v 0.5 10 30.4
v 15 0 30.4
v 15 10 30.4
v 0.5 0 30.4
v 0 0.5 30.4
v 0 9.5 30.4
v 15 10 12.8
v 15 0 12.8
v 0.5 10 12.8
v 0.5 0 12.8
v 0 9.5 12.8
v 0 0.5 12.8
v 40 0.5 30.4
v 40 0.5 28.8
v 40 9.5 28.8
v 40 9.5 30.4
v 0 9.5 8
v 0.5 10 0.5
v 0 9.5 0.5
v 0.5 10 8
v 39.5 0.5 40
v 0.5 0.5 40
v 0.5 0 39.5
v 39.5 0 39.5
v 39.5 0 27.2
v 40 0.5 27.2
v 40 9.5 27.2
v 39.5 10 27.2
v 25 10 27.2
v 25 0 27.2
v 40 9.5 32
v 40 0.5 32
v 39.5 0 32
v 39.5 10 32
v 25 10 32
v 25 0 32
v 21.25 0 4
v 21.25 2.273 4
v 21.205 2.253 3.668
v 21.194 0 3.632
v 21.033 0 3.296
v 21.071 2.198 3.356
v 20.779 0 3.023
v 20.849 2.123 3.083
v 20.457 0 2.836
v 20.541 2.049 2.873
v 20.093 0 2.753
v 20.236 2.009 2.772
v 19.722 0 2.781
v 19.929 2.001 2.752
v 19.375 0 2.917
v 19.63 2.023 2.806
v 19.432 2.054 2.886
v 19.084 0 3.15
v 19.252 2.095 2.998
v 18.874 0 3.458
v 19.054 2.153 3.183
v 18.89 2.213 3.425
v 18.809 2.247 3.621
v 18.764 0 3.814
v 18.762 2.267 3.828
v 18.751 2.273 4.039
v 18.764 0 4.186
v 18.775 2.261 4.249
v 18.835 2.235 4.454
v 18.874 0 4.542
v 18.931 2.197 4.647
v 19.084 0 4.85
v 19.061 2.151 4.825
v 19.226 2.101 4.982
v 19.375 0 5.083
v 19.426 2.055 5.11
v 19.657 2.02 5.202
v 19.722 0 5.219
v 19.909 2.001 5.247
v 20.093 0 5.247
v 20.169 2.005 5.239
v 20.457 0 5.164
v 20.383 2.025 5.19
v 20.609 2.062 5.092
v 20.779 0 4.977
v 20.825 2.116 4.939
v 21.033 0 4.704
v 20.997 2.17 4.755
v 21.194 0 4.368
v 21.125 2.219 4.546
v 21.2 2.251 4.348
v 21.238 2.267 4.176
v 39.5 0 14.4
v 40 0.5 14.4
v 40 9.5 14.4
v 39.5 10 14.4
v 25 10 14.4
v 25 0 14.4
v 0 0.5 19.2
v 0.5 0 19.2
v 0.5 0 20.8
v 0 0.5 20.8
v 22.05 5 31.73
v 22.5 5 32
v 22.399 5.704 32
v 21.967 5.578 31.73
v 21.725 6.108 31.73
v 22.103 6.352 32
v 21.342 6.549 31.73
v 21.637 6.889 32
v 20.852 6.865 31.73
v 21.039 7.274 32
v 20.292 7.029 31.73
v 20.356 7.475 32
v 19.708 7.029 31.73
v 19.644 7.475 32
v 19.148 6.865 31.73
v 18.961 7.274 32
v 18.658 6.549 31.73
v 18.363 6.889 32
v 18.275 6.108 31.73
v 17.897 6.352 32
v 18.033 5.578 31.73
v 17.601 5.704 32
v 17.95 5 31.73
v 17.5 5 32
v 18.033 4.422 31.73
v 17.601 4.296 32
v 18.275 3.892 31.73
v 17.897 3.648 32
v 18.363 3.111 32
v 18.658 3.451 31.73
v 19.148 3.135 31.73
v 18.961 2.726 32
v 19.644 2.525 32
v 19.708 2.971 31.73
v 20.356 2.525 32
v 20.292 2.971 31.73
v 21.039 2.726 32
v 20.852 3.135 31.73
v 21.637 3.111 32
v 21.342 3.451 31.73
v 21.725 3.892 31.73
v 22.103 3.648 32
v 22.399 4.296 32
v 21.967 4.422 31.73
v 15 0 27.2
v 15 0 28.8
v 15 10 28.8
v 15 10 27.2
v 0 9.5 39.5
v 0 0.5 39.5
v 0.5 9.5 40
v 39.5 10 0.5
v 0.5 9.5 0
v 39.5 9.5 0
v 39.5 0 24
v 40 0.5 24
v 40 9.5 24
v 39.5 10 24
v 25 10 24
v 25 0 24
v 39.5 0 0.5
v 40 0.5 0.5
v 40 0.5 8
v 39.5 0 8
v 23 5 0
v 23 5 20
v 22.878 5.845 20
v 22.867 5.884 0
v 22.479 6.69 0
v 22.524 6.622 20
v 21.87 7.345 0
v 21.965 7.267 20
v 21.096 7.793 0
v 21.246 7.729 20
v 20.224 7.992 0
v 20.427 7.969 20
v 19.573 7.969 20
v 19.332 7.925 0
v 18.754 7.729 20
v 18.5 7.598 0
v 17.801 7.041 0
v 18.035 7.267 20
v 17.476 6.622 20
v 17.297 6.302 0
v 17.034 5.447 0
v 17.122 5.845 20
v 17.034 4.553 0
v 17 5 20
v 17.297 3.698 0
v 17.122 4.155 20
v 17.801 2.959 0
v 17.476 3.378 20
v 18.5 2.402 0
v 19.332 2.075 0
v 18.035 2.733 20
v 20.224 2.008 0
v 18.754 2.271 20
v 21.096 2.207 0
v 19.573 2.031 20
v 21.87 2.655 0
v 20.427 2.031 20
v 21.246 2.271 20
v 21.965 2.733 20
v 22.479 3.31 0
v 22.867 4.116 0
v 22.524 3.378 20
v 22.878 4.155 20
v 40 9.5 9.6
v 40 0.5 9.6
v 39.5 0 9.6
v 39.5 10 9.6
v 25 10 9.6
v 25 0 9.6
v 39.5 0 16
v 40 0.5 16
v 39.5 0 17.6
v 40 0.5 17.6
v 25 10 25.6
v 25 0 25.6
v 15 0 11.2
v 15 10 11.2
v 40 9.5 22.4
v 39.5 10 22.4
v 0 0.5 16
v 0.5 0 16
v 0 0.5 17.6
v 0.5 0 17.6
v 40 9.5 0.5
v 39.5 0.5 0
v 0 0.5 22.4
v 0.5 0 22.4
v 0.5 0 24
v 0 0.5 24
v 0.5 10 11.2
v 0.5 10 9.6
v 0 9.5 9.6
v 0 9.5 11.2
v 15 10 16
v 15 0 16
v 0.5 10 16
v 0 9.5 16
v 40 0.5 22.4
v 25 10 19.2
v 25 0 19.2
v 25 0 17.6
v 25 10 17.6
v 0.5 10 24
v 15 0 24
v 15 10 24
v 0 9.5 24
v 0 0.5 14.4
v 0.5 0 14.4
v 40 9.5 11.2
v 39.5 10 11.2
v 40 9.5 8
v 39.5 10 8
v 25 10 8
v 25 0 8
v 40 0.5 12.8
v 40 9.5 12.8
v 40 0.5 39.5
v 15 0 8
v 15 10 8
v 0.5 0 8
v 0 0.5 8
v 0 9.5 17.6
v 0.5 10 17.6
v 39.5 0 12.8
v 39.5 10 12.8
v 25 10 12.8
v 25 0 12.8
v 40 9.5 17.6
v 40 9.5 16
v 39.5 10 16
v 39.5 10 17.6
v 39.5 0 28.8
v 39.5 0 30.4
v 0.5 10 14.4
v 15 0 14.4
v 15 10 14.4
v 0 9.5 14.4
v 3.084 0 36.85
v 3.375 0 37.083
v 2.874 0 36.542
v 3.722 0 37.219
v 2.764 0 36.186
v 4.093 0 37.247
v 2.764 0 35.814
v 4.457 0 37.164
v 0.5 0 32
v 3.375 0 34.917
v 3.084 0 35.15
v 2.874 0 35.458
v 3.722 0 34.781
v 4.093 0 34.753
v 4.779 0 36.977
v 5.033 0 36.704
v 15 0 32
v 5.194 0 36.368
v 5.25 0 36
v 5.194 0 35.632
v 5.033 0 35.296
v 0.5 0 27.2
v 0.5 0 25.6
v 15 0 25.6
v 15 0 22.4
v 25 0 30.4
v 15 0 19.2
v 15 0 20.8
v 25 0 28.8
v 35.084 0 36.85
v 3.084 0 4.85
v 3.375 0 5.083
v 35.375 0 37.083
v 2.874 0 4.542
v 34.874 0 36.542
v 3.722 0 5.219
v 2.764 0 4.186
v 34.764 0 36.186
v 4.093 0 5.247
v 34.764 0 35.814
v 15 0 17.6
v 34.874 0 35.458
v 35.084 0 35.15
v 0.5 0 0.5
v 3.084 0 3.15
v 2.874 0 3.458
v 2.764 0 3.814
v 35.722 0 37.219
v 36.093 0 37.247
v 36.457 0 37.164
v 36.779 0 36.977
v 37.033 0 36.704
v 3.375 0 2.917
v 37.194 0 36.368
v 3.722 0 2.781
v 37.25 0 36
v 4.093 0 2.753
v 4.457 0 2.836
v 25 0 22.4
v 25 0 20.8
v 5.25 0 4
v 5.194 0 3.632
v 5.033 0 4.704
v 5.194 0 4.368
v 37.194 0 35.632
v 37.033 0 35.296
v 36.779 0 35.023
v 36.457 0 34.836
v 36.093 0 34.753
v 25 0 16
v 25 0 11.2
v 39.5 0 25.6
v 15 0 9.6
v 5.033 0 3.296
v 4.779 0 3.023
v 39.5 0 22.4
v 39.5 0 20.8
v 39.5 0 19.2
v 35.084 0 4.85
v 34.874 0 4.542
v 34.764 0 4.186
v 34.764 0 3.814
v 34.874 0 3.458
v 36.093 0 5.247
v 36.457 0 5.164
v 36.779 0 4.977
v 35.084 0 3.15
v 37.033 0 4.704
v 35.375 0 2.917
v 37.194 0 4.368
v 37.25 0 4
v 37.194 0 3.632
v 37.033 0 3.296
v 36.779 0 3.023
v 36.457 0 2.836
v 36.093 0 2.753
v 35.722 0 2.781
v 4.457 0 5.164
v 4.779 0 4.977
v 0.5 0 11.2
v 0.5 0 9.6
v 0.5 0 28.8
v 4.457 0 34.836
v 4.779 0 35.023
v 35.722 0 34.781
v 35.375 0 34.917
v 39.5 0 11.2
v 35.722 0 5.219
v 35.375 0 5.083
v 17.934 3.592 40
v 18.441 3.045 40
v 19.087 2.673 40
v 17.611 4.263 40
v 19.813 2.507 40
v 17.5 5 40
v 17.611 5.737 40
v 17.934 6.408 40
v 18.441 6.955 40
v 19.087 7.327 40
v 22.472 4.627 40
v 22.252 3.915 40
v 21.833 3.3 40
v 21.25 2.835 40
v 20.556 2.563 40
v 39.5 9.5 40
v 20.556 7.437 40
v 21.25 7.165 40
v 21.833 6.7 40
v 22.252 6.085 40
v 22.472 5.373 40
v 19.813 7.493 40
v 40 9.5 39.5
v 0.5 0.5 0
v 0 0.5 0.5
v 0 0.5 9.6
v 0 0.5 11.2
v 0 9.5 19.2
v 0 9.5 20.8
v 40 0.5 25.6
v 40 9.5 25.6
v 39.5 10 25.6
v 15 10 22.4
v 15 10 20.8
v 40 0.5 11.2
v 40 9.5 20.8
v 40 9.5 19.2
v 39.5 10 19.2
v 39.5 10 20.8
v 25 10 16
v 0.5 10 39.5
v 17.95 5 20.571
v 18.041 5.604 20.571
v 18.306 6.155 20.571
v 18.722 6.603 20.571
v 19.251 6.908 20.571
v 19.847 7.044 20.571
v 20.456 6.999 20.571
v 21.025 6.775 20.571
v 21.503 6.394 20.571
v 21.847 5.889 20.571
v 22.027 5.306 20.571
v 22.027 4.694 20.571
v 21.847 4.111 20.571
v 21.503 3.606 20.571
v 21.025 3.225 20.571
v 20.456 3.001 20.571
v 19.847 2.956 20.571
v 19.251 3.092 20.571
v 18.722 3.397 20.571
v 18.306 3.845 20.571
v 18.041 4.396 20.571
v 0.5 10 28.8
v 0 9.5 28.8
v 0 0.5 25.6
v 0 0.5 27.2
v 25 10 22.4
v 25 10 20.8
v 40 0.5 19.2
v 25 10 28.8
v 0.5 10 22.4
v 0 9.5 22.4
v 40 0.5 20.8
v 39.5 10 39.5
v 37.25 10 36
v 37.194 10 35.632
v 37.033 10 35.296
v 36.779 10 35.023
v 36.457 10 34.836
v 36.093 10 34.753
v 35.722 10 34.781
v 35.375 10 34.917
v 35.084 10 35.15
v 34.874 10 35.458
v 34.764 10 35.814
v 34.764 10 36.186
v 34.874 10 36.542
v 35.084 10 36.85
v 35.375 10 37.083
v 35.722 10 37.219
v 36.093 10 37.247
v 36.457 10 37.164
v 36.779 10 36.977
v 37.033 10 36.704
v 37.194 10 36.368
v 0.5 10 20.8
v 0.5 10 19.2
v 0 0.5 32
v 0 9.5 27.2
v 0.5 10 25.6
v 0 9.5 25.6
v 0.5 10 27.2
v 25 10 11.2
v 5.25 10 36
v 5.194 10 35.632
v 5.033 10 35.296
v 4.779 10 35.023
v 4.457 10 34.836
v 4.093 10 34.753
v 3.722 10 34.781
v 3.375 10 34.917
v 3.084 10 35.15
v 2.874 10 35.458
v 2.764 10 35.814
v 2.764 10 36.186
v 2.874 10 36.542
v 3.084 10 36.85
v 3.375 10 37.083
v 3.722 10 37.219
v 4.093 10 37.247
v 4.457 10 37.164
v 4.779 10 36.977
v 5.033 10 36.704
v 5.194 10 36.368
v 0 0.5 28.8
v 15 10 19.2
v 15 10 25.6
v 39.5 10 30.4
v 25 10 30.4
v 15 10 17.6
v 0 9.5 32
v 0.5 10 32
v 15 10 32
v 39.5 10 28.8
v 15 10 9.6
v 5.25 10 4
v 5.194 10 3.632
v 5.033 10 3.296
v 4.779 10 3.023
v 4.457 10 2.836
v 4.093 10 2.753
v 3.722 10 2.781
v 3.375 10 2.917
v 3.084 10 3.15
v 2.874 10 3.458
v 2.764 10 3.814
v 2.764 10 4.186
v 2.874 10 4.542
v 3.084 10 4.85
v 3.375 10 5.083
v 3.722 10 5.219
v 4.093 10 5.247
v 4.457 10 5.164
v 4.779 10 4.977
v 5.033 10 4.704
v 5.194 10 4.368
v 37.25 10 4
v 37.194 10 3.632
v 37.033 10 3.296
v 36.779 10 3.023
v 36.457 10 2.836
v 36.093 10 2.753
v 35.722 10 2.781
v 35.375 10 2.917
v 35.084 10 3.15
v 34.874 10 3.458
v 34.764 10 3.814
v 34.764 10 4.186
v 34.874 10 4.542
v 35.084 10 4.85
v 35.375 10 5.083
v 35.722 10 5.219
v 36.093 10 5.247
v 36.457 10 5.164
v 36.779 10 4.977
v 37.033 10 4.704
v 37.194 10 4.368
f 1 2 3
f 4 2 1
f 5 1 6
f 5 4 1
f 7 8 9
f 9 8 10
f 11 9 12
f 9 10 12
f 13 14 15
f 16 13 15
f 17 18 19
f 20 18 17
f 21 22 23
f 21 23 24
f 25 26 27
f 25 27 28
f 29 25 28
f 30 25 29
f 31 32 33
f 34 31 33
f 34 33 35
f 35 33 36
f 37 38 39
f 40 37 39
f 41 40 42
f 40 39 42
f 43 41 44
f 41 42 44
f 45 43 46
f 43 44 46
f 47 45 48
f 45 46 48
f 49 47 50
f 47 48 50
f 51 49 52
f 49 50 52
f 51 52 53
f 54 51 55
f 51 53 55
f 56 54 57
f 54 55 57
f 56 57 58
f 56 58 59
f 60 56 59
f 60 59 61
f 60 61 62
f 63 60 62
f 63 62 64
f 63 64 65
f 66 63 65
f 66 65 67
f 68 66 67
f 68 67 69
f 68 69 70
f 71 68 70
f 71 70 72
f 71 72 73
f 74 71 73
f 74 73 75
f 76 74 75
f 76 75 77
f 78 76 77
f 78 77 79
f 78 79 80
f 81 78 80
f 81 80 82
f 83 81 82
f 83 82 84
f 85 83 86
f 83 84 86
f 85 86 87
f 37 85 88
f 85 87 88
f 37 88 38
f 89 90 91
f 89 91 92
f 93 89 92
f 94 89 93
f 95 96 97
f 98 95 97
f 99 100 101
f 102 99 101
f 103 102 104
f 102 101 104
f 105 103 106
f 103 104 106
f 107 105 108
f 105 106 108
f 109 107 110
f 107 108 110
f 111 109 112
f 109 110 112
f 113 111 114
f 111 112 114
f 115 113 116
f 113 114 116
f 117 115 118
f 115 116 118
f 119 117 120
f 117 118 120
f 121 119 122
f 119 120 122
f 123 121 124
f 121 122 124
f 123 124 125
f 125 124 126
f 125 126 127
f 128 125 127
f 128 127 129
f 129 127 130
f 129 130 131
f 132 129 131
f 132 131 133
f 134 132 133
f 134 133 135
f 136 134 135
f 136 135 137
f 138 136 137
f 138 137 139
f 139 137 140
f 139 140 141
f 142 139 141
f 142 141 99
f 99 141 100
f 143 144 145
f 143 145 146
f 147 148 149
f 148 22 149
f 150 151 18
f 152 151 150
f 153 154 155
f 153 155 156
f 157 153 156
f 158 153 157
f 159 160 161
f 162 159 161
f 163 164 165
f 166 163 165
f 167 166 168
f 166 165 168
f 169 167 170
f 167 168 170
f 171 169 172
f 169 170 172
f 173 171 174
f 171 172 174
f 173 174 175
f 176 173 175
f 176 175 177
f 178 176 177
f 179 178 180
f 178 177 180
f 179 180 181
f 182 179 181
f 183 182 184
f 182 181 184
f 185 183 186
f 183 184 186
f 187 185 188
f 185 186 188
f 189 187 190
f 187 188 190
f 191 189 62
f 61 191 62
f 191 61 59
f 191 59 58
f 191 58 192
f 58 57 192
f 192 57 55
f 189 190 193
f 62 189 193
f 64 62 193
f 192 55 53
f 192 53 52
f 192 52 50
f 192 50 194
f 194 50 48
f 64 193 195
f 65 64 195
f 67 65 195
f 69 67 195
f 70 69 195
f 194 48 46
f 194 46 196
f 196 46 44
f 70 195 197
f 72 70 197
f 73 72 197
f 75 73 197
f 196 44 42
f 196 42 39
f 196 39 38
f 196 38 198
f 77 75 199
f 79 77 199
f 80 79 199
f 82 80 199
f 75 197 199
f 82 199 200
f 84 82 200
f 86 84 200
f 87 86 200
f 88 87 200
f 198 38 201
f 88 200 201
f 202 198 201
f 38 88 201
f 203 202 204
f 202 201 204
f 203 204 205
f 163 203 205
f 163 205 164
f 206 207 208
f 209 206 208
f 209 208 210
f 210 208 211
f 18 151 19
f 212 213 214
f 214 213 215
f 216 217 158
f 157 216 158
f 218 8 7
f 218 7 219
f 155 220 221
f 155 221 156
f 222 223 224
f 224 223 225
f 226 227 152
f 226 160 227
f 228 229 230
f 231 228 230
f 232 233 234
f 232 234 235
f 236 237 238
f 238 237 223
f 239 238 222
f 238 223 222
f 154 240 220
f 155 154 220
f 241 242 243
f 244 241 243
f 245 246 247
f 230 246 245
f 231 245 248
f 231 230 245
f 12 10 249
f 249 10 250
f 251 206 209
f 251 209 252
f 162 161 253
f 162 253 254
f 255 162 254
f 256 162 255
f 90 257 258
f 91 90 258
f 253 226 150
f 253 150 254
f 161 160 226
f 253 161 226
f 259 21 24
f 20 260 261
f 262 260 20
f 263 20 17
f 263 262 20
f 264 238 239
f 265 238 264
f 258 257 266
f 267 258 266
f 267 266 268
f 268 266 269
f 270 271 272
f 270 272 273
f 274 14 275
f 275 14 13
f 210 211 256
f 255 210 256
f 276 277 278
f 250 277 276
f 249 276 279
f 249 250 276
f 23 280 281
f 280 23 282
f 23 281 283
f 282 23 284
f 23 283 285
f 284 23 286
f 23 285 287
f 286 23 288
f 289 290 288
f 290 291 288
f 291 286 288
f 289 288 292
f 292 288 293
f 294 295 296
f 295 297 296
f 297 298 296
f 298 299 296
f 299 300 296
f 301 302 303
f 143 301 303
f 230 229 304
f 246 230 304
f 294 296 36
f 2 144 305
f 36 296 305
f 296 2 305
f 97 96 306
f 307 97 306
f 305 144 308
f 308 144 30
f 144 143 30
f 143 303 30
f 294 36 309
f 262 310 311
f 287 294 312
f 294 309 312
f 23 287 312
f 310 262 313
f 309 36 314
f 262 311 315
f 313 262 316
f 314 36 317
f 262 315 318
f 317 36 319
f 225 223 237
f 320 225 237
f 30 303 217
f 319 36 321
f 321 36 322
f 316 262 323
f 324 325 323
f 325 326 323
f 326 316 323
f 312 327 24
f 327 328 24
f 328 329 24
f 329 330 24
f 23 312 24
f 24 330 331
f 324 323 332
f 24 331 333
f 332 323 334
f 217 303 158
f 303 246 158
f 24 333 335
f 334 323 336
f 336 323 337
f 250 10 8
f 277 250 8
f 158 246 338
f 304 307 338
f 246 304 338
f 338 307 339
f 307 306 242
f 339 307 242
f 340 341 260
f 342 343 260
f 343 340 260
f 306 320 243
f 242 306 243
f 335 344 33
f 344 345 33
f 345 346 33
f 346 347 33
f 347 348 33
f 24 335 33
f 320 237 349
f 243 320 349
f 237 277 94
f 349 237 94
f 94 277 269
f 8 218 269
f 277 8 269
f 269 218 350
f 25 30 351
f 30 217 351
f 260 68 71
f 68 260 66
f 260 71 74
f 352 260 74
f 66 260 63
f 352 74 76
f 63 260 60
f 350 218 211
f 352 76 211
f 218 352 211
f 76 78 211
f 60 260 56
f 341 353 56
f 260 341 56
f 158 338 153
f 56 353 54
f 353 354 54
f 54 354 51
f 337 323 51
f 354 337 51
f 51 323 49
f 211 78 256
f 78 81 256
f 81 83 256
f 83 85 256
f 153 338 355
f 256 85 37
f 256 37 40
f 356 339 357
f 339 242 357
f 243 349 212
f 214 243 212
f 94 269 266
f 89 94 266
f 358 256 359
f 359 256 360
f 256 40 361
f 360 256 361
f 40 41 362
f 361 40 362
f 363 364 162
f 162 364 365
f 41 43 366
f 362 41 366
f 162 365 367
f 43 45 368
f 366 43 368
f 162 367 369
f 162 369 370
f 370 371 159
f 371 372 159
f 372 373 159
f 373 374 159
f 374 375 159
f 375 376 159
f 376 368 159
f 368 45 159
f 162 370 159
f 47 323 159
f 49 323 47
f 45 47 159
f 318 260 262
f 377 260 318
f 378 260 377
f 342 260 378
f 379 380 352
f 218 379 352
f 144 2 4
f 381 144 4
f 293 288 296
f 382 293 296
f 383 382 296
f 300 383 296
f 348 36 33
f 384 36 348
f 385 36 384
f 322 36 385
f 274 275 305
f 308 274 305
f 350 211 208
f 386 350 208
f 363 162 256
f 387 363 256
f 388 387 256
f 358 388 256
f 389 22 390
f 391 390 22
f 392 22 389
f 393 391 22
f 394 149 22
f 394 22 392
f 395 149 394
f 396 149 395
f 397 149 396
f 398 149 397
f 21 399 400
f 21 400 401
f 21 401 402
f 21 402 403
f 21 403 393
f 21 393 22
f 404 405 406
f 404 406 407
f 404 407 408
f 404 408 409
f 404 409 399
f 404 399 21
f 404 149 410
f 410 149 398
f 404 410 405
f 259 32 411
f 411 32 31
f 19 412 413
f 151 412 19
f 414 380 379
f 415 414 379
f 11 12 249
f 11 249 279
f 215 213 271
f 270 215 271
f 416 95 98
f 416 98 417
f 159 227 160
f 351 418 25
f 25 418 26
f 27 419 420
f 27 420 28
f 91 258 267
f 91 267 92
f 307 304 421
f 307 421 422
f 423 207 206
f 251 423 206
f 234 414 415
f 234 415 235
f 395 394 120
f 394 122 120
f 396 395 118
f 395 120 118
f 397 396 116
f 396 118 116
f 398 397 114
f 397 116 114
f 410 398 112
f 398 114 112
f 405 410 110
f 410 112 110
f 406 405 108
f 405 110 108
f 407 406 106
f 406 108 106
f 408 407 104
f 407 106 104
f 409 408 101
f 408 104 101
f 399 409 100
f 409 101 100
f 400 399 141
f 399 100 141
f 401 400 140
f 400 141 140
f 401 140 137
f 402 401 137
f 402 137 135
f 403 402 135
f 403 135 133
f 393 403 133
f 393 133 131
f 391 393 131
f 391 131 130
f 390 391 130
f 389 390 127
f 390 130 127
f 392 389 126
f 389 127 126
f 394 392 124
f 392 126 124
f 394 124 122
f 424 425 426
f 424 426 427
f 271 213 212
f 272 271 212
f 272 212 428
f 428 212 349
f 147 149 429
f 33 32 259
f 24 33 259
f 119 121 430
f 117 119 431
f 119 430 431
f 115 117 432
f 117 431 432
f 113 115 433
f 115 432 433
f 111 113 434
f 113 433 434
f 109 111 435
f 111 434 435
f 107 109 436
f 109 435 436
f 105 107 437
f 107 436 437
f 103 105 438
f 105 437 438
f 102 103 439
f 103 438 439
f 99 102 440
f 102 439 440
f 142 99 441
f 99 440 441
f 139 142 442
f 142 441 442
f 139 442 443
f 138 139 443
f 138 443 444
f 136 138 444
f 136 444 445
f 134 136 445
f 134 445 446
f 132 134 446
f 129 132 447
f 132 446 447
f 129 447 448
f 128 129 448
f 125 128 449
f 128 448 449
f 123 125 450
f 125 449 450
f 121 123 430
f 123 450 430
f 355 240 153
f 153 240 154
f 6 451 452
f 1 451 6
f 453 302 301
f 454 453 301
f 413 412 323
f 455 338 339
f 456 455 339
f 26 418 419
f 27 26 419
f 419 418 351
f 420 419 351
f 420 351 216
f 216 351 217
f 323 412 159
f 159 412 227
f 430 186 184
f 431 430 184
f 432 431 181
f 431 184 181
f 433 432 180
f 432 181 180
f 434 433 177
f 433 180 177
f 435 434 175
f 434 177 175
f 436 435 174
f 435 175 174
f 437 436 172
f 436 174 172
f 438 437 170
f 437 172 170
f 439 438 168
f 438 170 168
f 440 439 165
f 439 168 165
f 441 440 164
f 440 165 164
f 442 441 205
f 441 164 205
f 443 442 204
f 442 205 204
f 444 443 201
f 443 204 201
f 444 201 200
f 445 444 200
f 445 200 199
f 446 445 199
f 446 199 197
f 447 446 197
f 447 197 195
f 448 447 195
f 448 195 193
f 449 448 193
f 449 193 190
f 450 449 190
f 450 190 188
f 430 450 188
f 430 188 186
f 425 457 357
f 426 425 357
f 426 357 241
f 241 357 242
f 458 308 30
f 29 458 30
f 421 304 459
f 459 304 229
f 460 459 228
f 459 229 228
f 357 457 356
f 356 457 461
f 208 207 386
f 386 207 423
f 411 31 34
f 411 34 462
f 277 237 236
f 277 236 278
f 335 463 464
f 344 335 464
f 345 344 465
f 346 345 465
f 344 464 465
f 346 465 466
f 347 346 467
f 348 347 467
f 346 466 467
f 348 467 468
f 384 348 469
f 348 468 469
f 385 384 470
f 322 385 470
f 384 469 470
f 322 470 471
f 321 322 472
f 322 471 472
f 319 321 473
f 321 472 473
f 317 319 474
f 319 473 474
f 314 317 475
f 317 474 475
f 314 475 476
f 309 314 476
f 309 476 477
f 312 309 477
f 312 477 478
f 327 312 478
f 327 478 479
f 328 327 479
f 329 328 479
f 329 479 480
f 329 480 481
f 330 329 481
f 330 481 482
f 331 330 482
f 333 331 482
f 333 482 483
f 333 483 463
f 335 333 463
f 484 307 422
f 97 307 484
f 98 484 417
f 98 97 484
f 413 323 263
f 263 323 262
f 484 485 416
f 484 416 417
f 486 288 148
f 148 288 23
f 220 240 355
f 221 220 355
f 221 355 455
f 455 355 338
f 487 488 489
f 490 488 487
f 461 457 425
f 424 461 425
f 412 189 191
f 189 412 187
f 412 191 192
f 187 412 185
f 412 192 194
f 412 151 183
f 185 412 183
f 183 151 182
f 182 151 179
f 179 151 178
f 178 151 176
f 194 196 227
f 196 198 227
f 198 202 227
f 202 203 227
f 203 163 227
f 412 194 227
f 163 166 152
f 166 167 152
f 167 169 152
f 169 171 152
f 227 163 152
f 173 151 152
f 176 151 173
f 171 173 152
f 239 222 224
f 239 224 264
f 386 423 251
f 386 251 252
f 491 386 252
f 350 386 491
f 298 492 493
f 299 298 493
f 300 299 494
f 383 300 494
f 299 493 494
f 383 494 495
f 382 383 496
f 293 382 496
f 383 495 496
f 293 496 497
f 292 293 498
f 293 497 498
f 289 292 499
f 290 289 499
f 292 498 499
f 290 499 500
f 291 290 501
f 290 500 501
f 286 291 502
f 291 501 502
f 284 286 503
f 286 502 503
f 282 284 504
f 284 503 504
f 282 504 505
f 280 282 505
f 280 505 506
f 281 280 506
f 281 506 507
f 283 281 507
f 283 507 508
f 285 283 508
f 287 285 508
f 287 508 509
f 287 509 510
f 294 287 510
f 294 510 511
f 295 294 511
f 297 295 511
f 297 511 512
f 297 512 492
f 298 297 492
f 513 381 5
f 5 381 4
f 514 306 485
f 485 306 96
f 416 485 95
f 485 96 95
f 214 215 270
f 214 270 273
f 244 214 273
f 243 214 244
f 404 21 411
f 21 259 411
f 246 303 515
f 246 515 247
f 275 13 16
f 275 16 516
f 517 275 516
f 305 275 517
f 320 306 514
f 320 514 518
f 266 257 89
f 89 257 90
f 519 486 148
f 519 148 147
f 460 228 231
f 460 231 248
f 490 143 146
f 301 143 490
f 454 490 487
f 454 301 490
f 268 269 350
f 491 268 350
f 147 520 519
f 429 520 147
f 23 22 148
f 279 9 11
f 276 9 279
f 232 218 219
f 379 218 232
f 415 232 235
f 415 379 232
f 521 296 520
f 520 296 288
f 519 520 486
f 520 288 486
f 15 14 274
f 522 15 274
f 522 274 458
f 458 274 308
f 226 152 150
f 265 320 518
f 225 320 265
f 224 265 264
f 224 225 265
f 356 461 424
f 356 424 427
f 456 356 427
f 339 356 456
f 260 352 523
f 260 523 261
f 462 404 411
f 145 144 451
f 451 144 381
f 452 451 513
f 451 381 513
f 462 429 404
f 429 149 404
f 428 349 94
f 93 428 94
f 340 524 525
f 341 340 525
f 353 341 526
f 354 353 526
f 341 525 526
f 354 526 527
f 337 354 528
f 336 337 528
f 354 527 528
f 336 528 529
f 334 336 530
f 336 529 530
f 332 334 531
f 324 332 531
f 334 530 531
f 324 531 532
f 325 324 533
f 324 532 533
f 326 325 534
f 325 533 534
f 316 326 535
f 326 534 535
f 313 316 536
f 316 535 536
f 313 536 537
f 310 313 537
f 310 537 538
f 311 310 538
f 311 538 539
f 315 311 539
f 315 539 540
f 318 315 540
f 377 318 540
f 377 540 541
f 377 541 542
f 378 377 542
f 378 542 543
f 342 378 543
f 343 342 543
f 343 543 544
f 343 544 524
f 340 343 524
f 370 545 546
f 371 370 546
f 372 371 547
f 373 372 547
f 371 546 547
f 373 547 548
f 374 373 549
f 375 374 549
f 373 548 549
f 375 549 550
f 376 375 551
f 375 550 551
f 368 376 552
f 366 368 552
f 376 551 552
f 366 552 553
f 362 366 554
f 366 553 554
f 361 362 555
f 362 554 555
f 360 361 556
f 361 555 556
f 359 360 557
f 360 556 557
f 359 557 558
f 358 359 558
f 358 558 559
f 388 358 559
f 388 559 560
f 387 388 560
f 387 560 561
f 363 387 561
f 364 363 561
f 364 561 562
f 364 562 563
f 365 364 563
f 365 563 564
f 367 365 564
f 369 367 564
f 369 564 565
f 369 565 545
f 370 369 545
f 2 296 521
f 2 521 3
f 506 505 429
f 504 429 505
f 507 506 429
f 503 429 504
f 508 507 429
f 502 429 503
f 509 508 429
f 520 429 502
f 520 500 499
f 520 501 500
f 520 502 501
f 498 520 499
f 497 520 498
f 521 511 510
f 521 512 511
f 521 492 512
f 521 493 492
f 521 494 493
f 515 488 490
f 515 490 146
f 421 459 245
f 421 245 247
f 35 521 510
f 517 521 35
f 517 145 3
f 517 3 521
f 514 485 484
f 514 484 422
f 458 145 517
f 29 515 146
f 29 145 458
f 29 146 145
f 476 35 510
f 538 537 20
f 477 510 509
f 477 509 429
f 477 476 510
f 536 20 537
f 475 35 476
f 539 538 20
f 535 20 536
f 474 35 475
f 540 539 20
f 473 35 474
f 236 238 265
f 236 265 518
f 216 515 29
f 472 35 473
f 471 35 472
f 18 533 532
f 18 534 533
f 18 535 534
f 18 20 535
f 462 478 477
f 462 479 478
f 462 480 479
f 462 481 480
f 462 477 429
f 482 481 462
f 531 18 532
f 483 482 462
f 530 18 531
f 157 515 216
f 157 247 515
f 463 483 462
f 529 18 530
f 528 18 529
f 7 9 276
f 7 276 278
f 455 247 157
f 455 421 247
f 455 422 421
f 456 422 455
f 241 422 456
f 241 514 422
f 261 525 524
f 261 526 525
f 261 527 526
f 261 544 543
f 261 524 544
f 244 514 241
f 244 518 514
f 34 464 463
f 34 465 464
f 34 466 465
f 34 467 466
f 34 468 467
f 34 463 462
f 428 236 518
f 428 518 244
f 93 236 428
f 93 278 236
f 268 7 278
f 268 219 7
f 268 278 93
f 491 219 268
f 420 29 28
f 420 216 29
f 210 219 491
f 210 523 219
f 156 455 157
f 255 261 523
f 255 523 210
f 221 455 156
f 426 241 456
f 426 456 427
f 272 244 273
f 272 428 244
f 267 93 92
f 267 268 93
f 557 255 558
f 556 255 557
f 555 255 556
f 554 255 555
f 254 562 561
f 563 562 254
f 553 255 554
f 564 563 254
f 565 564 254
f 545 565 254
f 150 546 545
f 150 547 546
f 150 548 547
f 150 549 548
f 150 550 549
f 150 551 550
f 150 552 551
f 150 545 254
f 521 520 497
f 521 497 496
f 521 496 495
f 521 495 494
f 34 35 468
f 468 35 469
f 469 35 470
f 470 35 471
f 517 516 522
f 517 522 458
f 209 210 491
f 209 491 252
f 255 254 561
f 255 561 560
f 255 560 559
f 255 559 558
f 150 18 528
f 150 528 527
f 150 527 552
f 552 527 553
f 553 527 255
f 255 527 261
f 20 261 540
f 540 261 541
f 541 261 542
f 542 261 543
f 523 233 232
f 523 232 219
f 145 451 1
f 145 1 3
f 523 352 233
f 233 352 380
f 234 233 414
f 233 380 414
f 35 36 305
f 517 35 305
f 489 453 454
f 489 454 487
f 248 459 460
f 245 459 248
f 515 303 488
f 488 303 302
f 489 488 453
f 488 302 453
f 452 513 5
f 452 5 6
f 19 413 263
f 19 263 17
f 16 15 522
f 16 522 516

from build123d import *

# Parameters (mm, degrees)
ESQUISSE2_W                                   = 40
ESQUISSE2_H                                   = 10
BOSS_EXTRU_1_DEPTH                            = 40
DIAM_TRE_DU_PER_AGE_4_1_4_1_1_D               = 4.1
TROU_POUR_TARAUDAGE_POUR_TROU_TARAUD_M6_D     = 5
TROU_POUR_TARAUDAGE_POUR_TROU_TARAUD_M6_DEPTH = 8
TROU_POUR_TARAUDAGE_POUR_TROU_TARAUD_M6_TIP   = 1.502151548
DIAM_TRE_DU_PER_AGE_6_0_6_1_D                 = 6
DIAM_TRE_DU_PER_AGE_6_0_6_1_DEPTH             = 20
DIAM_TRE_DU_PER_AGE_6_0_6_1_TIP               = 1.802581857
TROU_POUR_TARAUDAGE_POUR_TROU_TARAUD_M3_D     = 2.5
TROU_POUR_TARAUDAGE_POUR_TROU_TARAUD_2_D      = 2.5
TROU_POUR_TARAUDAGE_POUR_TROU_TARAUD_2_DEPTH  = 5
TROU_POUR_TARAUDAGE_POUR_TROU_TARAUD_2_TIP    = 0.751075774
CHANFREIN1_SIZE                               = 0.5
ESQUISSE20_W                                  = 15
ESQUISSE20_H                                  = 1.6
ENL_V_MAT_EXTRU_1_DEPTH                       = 58.445626465
R_P_TITION_LIN_AIRE1_COUNT                    = 8
R_P_TITION_LIN_AIRE1_PITCH                    = 3.2


with BuildPart() as part:
    # Esquisse2 → Boss.-Extru.1 (new body)
    with BuildSketch(Plane.XY):
        with Locations((20, 5)):
            Rectangle(ESQUISSE2_W, ESQUISSE2_H)
    extrude(amount=BOSS_EXTRU_1_DEPTH)

    # Diamètre du perçage Ø4.1 (4.1)1 (through all)
    with Locations(Plane.XY.offset(40)):
        with Locations((20, 5)):
            Hole(DIAM_TRE_DU_PER_AGE_4_1_4_1_1_D / 2)

    # Trou pour taraudage pour trou taraudé M61
    with Locations(Plane.XY.offset(40)):
        with Locations((20, 5)):
            Hole(TROU_POUR_TARAUDAGE_POUR_TROU_TARAUD_M6_D / 2, depth=TROU_POUR_TARAUDAGE_POUR_TROU_TARAUD_M6_DEPTH)
            with Locations((0, 0, -(TROU_POUR_TARAUDAGE_POUR_TROU_TARAUD_M6_DEPTH + TROU_POUR_TARAUDAGE_POUR_TROU_TARAUD_M6_TIP / 2))):  # 118° drill point
                Cone(0, TROU_POUR_TARAUDAGE_POUR_TROU_TARAUD_M6_D / 2, TROU_POUR_TARAUDAGE_POUR_TROU_TARAUD_M6_TIP, mode=Mode.SUBTRACT)

    # Diamètre du perçage Ø6.0 (6)1
    with Locations(Plane(origin=(0, 0, 0), x_dir=(-1, 0, 0), z_dir=(0, 0, -1))):
        with Locations((-20, 5)):
            Hole(DIAM_TRE_DU_PER_AGE_6_0_6_1_D / 2, depth=DIAM_TRE_DU_PER_AGE_6_0_6_1_DEPTH)
            with Locations((0, 0, -(DIAM_TRE_DU_PER_AGE_6_0_6_1_DEPTH + DIAM_TRE_DU_PER_AGE_6_0_6_1_TIP / 2))):  # 118° drill point
                Cone(0, DIAM_TRE_DU_PER_AGE_6_0_6_1_D / 2, DIAM_TRE_DU_PER_AGE_6_0_6_1_TIP, mode=Mode.SUBTRACT)

    # Trou pour taraudage pour trou taraud_ M3 (through all)
    with Locations(Plane(origin=(0, 0, 0), x_dir=(-1, 0, 0), z_dir=(0, -1, 0))):
        with Locations((-4, -36), (-36, -36), (-36, -4), (-4, -4)):
            Hole(TROU_POUR_TARAUDAGE_POUR_TROU_TARAUD_M3_D / 2)

    # Trou pour taraudage pour trou taraud 2
    with Locations(Plane(origin=(0, 0, 0), x_dir=(-1, 0, 0), z_dir=(0, -1, 0))):
        with Locations((-20, -4)):
            Hole(TROU_POUR_TARAUDAGE_POUR_TROU_TARAUD_2_D / 2, depth=TROU_POUR_TARAUDAGE_POUR_TROU_TARAUD_2_DEPTH)
            with Locations((0, 0, -(TROU_POUR_TARAUDAGE_POUR_TROU_TARAUD_2_DEPTH + TROU_POUR_TARAUDAGE_POUR_TROU_TARAUD_2_TIP / 2))):  # 118° drill point
                Cone(0, TROU_POUR_TARAUDAGE_POUR_TROU_TARAUD_2_D / 2, TROU_POUR_TARAUDAGE_POUR_TROU_TARAUD_2_TIP, mode=Mode.SUBTRACT)

    # Chanfrein1
    chanfrein1_edges = [part.edges().sort_by_distance(p)[0] for p in [
        (40, 5, 40),
        (20, 10, 40),
        (0, 5, 40),
        (20, 10, 0),
        (40, 5, 0),
        (20, 0, 0),
        (0, 5, 0),
        (20, 0, 40),
        (0, 10, 20),
        (40, 10, 20),
        (40, 0, 20),
        (0, 0, 20),
    ]]
    chamfer(chanfrein1_edges, length=CHANFREIN1_SIZE)

    # Esquisse20 → Enlèv. mat.-Extru.1 (cut, through all)
    with BuildSketch(Plane(origin=(0, 0, 0), x_dir=(-1, 0, 0), z_dir=(0, -1, 0))):
        with Locations((-7.5, -31.2)):
            Rectangle(ESQUISSE20_W, ESQUISSE20_H)
        with Locations((-32.5, -31.2)):
            Rectangle(ESQUISSE20_W, ESQUISSE20_H)
    enl_v_mat_extru_1 = extrude(amount=-ENL_V_MAT_EXTRU_1_DEPTH, mode=Mode.SUBTRACT)

    # Répétition linéaire1: Enlèv. mat.-Extru.1 ×8
    with Locations(*[(0, 0, -i * R_P_TITION_LIN_AIRE1_PITCH) for i in range(1, R_P_TITION_LIN_AIRE1_COUNT)]):
        add(enl_v_mat_extru_1, mode=Mode.SUBTRACT)


solid = part.part
